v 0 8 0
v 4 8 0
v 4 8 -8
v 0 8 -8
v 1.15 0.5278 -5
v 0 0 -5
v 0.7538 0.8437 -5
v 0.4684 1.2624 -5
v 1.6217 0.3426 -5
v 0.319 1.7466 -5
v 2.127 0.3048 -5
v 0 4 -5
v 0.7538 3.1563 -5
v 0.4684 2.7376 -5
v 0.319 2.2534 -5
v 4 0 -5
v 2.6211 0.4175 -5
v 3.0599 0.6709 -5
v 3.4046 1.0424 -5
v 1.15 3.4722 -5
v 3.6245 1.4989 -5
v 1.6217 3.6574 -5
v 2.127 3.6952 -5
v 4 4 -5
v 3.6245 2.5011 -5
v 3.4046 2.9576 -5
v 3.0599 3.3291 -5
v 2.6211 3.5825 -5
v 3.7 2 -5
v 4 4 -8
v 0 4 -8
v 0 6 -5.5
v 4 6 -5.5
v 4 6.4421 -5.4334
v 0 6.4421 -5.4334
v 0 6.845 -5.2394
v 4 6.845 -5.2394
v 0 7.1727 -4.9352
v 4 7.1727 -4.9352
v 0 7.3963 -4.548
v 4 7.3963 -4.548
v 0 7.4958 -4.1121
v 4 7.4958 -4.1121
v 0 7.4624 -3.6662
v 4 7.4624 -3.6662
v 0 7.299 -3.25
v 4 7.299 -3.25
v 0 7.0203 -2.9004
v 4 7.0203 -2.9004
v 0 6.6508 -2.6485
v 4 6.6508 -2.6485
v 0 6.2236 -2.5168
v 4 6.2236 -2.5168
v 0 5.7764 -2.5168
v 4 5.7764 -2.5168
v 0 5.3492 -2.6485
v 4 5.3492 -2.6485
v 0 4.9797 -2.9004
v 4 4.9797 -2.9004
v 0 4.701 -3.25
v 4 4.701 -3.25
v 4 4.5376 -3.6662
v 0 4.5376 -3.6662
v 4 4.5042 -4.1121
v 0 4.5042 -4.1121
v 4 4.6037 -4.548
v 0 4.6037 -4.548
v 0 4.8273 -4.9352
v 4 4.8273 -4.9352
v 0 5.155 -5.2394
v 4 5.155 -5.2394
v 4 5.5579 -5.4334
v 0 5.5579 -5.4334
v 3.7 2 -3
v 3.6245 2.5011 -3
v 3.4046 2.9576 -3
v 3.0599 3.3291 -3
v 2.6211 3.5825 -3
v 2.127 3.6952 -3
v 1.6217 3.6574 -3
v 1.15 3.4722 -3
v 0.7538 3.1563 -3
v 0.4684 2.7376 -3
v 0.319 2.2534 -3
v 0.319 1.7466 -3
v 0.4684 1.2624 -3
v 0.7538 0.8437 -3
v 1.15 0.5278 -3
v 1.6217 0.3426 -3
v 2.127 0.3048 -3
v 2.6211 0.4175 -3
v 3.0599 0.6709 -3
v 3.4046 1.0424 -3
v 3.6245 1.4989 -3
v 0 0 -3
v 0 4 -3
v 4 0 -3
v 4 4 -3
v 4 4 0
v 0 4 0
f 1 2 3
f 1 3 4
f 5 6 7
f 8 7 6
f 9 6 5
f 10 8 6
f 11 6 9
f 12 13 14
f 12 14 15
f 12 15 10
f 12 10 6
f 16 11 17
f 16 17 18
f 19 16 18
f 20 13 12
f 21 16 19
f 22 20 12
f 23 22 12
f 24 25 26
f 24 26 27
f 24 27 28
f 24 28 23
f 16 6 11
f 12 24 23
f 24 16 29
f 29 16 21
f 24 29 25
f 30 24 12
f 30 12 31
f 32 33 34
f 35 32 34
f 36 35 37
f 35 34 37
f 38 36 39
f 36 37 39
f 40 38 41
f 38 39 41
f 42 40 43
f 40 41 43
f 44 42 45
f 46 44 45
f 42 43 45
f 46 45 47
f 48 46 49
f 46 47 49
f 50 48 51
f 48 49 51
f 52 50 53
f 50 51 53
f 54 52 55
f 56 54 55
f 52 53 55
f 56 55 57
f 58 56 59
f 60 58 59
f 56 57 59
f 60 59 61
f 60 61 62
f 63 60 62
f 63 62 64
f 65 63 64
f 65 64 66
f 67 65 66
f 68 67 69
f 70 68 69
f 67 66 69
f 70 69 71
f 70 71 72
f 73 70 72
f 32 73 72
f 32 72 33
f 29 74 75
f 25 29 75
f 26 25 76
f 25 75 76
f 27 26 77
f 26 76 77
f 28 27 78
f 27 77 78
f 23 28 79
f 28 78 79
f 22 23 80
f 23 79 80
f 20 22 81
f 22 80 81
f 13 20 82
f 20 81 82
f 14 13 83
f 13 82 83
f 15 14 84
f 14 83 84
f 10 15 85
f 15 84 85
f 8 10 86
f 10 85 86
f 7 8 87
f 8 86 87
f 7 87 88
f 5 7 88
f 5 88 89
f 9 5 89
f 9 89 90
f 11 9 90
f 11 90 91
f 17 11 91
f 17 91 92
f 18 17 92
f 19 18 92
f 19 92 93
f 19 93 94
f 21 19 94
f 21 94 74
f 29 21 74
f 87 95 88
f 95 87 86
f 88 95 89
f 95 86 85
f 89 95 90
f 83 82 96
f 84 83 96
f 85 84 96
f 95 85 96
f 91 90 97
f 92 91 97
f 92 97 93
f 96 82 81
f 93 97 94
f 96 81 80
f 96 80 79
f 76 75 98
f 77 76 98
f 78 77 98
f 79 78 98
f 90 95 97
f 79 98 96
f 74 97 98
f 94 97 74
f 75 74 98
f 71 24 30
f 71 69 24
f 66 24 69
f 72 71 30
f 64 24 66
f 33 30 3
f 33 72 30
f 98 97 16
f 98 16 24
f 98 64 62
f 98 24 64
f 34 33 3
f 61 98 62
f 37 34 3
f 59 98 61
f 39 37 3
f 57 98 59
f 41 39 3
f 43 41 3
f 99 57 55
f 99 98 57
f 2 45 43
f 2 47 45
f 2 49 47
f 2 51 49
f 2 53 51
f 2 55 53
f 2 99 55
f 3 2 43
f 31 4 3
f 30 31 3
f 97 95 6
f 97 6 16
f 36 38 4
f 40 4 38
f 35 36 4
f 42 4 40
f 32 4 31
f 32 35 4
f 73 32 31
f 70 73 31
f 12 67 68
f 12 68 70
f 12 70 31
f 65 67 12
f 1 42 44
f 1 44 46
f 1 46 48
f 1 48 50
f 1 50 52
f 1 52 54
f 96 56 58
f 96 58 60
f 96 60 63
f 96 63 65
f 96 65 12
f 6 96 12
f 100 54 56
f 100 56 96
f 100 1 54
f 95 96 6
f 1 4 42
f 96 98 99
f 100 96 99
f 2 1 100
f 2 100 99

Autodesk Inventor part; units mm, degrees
ref_plane "YZ Plane" through (0, 0, 0) normal (1, 0, 0) x (0, 1, 0)
ref_plane "XZ Plane" through (0, 0, 0) normal (0, 1, 0) x (-1, 0, 0)
ref_plane "XY Plane" through (0, 0, 0) normal (0, 0, 1) x (1, 0, 0)
sketch "Skizze1" plane through (0, 0, 0) normal (0, 0, 1) x (1, 0, 0)
  line L0 (0, 0) -> (4, 0)
  line L1 (4, 0) -> (4, 8)
  line L2 (4, 8) -> (0, 8)
  line L3 (0, 8) -> (0, 0)
  dimension "d0" = 4
  dimension "d1" = 8
extrude "Extrusion1" add sketch "Skizze1" against normal blind 8
sketch "Skizze12" plane through (4, 0, 0) normal (1, 0, 0) x (0, 0, -1)
  line L0 (0, 8) -> (0, 0) projected
  line L1 (0, 0) -> (3, 0)
  line L2 (3, 0) -> (3, 4)
  line L3 (3, 4) -> (0, 4)
  line L4 (0, 4) -> (0, 0)
  line L5 (8, 0) -> (5, 0)
  line L6 (5, 0) -> (5, 4)
  line L7 (5, 4) -> (8, 4)
  line L8 (8, 4) -> (8, 0)
  dimension "d45" = 4
  dimension "d46" = 4
  dimension "d47" = 3
  dimension "d48" = 3
extrude "Extrusion10" cut sketch "Skizze12" against normal blind 5
sketch "Skizze13" plane through (4, 0, -3) normal (0, 0, 1) x (1, 0, 0)
  circle A0 centre (-2, 2) radius 1.7
  line L0 (0, 0) -> (-4, 0) projected
  line L1 (0, 4) -> (0, 0) projected
  dimension "d51" = 3.4
  dimension "d52" = 2
  dimension "d53" = 2
extrude "Extrusion11" cut sketch "Skizze13" against normal blind 3
sketch "Skizze14" plane through (4, 8, 0) normal (1, 0, 0) x (0, 0, -1)
  circle A0 centre (4, -2) radius 1.5
  line L0 (0, -4) -> (0, 0) projected
  line L1 (0, -4) -> (3, -4) projected
  point P0 (0, -8)
  dimension "d56" = 3
  dimension "d57" = 4
  dimension "d58" = 2
extrude "Extrusion12" cut sketch "Skizze14" against normal blind 10
properties part number "kamerahaltung"
